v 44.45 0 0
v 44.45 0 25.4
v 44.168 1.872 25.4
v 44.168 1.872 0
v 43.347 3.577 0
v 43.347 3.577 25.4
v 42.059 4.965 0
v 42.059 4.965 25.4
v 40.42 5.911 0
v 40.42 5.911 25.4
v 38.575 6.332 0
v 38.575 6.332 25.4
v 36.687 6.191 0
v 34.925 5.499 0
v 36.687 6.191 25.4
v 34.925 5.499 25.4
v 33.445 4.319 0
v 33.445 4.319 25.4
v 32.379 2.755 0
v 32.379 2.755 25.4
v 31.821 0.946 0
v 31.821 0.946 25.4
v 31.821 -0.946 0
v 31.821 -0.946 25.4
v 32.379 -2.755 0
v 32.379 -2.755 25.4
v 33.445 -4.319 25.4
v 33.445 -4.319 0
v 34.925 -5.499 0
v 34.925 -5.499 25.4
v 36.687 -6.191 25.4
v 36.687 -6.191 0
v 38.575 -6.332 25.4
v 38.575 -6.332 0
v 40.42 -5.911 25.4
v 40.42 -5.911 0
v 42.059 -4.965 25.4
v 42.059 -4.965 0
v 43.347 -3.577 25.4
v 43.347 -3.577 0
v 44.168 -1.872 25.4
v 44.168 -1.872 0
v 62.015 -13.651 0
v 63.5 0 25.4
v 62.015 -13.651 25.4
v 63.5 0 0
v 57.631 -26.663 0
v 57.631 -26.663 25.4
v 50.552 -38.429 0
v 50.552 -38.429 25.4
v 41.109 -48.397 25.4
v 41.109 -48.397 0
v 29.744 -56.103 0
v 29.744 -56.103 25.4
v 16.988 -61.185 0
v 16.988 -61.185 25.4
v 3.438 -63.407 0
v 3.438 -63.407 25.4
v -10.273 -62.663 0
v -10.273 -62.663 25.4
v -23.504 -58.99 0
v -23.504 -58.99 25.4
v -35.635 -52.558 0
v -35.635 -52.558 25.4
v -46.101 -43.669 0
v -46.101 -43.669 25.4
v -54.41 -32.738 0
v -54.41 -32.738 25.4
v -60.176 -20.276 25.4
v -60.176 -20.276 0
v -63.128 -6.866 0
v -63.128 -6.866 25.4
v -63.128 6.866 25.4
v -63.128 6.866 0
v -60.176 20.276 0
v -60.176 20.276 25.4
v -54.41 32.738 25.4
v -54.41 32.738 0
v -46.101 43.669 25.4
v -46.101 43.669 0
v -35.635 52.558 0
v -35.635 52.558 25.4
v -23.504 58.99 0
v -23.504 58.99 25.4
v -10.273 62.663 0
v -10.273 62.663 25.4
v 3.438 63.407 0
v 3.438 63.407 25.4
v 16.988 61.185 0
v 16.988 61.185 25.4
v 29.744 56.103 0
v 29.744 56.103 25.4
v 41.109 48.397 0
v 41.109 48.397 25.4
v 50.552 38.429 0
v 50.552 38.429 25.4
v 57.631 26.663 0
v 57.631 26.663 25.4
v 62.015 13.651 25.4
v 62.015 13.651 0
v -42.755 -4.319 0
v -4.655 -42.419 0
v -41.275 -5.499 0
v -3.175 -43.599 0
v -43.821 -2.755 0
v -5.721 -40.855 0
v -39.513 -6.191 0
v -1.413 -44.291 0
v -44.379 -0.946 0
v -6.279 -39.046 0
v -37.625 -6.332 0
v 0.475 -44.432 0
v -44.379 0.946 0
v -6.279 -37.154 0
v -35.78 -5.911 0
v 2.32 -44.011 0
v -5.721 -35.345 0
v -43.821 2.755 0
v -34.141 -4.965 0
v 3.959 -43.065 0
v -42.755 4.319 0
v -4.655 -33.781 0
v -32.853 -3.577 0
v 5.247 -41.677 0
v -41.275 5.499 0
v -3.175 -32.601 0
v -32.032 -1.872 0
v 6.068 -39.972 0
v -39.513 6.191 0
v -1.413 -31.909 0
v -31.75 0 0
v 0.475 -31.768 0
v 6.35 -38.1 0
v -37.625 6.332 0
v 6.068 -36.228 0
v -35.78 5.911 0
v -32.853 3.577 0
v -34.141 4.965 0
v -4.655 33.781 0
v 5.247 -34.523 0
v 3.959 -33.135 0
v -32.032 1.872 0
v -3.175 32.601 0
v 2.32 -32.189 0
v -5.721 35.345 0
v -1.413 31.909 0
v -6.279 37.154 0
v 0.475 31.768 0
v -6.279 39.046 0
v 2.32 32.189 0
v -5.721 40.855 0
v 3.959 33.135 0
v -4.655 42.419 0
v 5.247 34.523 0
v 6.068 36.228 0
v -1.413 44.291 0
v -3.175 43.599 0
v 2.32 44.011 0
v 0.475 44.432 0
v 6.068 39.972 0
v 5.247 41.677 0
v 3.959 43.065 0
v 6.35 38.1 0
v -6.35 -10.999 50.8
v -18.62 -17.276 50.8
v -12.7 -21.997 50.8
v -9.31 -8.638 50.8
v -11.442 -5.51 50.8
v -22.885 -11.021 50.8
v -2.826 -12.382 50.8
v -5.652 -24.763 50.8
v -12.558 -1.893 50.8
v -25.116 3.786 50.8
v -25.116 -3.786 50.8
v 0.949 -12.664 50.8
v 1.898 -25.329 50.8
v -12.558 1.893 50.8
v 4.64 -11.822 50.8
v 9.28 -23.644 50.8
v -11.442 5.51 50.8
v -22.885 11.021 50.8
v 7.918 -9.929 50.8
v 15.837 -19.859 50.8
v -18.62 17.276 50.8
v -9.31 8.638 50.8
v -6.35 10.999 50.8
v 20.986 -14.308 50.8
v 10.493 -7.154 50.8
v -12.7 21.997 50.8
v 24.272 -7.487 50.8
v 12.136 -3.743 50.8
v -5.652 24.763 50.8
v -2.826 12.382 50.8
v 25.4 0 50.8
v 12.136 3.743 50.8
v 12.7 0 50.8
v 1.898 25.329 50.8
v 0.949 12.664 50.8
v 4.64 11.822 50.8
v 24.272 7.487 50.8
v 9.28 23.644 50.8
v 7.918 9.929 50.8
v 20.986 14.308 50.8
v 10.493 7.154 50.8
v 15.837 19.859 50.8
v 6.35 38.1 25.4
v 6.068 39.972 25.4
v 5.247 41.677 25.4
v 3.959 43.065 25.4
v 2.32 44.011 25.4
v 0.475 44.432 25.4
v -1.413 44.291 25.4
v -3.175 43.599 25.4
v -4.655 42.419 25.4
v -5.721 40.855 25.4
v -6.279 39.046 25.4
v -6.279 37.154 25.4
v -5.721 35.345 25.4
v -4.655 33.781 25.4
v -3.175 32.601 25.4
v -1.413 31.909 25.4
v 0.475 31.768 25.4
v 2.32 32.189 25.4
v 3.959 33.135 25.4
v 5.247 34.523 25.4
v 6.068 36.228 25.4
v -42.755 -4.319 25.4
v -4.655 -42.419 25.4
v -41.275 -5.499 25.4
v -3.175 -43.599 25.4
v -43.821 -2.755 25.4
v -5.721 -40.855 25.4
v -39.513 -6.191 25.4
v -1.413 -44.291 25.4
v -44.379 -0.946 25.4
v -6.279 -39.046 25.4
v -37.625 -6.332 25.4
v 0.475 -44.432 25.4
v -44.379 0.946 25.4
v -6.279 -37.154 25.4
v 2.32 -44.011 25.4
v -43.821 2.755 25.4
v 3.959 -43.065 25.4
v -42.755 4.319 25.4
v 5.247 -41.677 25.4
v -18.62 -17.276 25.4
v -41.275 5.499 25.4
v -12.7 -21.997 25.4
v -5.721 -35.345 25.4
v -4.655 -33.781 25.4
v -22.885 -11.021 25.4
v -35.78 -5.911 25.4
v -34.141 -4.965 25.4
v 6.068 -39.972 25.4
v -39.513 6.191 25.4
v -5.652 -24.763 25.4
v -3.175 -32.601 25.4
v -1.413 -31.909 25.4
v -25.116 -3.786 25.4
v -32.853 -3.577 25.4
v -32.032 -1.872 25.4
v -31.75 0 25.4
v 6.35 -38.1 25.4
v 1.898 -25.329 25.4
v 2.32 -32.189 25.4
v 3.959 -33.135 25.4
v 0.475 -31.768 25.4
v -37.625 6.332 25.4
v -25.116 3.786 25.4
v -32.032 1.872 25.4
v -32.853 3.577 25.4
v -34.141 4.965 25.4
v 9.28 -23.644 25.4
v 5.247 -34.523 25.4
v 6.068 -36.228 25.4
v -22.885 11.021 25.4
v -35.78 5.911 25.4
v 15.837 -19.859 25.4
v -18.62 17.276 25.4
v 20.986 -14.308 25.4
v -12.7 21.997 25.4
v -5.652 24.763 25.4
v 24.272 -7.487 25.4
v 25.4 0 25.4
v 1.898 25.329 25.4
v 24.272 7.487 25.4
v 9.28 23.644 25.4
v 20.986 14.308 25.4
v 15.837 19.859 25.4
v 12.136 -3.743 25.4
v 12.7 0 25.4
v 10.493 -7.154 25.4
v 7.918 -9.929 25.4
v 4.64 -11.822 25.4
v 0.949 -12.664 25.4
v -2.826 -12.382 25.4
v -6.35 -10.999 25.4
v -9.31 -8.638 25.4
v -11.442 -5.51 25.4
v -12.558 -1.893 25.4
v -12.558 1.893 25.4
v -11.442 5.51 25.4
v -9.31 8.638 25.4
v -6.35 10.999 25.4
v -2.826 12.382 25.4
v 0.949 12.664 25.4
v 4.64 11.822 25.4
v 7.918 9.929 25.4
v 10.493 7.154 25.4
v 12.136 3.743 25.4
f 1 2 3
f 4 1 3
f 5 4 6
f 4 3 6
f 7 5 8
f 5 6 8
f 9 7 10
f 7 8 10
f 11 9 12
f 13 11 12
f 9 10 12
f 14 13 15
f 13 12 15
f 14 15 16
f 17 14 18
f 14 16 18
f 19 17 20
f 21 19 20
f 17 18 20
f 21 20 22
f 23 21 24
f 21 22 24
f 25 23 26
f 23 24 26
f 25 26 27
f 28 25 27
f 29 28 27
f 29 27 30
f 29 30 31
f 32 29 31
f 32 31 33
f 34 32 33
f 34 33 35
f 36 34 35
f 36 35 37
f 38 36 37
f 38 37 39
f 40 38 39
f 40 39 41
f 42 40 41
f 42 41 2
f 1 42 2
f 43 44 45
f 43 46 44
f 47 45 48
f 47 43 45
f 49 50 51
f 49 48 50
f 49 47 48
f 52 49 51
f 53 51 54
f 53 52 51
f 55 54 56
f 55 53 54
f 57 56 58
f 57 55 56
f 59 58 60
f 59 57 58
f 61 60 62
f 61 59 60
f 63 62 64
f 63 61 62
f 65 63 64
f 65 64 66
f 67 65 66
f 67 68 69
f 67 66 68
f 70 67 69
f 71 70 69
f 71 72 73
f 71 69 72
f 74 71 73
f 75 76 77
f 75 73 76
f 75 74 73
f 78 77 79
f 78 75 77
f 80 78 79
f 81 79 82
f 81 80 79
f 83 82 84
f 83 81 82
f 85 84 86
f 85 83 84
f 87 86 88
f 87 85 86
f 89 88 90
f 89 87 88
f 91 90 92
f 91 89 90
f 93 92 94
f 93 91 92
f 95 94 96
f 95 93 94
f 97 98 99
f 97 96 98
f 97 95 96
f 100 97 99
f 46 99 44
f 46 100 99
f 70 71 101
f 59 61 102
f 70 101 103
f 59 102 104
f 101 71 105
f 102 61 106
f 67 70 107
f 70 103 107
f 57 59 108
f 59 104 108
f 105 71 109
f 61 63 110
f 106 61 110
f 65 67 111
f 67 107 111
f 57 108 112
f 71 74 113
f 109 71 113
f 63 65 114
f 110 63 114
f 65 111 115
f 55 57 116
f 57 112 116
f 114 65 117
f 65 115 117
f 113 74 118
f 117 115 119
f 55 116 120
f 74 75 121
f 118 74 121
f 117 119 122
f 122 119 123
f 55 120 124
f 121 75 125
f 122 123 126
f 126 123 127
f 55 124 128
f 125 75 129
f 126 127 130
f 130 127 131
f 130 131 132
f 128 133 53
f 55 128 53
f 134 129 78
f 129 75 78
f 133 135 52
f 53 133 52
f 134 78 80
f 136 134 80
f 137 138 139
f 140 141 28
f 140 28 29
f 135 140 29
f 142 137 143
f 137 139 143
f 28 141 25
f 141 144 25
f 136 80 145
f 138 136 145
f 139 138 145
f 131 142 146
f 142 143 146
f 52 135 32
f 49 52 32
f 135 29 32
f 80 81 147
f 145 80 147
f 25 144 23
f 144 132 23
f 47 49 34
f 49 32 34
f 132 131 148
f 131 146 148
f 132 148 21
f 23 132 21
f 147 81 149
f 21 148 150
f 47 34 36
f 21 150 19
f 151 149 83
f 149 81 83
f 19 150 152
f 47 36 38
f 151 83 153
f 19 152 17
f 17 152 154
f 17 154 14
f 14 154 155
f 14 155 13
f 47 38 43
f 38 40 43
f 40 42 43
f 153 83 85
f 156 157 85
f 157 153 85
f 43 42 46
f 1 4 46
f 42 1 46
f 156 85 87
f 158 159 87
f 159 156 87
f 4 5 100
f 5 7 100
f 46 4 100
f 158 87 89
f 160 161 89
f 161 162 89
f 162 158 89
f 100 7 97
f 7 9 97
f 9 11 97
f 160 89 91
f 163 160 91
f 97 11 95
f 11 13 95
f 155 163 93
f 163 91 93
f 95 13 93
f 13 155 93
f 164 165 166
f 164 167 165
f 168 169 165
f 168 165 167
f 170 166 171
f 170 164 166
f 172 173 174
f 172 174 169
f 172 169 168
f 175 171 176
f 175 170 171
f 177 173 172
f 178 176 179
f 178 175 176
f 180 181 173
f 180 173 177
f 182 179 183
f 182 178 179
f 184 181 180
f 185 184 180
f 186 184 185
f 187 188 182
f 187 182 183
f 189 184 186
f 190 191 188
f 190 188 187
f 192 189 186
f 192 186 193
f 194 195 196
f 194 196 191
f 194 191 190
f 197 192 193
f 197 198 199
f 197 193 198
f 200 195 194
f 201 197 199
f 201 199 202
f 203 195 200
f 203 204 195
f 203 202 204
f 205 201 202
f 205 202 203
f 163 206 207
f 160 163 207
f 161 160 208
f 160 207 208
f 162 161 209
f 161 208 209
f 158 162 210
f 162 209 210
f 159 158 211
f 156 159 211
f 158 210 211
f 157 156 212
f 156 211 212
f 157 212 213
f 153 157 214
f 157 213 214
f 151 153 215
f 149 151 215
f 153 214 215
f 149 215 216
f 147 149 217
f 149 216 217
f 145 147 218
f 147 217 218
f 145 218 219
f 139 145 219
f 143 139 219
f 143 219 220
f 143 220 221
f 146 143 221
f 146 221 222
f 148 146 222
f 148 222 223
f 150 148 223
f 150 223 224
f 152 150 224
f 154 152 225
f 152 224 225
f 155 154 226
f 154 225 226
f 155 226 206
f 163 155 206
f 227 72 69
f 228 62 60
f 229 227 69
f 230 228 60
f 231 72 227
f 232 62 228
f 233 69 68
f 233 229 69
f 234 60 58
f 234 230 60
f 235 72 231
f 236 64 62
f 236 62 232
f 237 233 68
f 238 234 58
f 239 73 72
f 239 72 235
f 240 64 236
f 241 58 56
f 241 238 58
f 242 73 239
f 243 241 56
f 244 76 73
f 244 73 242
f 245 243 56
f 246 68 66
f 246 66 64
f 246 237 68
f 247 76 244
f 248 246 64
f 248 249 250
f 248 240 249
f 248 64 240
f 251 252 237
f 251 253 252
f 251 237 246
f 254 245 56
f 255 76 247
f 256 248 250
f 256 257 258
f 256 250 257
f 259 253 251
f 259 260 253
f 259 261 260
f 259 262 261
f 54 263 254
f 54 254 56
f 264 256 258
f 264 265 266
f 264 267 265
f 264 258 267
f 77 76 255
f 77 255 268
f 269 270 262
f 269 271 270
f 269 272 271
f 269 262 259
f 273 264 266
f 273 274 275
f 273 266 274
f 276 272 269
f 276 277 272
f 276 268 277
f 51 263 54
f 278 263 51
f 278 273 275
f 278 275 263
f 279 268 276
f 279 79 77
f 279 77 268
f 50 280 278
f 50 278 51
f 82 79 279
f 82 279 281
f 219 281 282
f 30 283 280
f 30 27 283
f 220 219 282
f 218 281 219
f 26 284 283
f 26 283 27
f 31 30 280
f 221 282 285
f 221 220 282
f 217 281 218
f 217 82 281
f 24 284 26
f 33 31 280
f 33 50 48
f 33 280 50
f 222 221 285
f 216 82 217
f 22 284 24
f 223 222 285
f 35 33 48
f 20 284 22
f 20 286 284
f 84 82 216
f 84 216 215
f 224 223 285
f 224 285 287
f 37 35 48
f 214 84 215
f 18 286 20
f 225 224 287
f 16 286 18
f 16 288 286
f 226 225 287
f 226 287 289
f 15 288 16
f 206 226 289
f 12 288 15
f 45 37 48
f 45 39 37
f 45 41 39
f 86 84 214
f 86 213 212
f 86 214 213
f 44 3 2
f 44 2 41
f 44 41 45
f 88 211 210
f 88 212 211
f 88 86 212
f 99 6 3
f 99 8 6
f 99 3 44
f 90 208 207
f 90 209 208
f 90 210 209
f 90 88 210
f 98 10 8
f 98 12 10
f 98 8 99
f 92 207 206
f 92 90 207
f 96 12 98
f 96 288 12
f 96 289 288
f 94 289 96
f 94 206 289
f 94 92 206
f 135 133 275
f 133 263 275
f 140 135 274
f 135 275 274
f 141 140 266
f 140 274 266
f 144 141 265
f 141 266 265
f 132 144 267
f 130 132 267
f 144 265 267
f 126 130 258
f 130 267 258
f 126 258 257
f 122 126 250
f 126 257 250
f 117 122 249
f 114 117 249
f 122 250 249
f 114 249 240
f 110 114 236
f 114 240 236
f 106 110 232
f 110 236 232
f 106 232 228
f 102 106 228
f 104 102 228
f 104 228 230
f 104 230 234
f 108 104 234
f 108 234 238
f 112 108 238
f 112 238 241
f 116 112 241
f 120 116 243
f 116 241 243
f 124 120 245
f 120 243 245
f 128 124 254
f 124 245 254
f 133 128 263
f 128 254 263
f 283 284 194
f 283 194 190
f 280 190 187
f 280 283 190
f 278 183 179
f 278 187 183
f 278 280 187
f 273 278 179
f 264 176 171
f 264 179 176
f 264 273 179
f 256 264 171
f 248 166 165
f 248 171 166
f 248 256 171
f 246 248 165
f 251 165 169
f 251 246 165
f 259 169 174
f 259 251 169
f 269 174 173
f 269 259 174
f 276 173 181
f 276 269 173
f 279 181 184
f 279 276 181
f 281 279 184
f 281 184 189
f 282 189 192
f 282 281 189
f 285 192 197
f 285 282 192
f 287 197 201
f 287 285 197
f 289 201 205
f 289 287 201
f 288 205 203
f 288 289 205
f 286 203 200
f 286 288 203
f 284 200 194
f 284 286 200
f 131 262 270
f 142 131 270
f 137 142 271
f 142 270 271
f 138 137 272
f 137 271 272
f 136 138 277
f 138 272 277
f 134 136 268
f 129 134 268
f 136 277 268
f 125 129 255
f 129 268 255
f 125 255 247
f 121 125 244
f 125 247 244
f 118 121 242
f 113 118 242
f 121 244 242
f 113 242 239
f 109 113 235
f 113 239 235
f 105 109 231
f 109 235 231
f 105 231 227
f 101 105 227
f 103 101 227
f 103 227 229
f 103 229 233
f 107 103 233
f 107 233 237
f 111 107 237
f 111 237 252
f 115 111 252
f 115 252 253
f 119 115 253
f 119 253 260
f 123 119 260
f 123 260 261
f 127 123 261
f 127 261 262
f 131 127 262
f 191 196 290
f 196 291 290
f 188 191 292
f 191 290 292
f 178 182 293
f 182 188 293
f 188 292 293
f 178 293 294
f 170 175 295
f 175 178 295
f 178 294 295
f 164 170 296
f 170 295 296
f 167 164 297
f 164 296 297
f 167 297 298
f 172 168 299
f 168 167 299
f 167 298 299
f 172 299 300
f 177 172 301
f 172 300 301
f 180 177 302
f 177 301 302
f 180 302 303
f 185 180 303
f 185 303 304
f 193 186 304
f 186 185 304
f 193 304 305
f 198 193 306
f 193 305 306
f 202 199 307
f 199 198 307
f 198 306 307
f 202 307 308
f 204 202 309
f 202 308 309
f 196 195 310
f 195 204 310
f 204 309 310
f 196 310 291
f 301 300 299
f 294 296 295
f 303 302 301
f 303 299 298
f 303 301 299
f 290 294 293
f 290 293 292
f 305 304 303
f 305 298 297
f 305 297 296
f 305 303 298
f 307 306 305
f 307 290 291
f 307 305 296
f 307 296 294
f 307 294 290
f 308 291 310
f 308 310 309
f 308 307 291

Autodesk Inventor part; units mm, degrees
ref_plane "YZ Plane" through (0, 0, 0) normal (1, 0, 0) x (0, 1, 0)
ref_plane "XZ Plane" through (0, 0, 0) normal (0, 1, 0) x (-1, 0, 0)
ref_plane "XY Plane" through (0, 0, 0) normal (0, 0, 1) x (1, 0, 0)
sketch "Sketch1" plane through (0, 0, 0) normal (0, 0, 1) x (1, 0, 0)
  circle A0 centre (0, 0) radius 63.5
  dimension "d0" = 127
extrude "Extrusion1" add sketch "Sketch1" along normal blind 25.4
sketch "Sketch2" plane through (0, 0, 25.4) normal (0, 0, 1) x (1, 0, 0)
  circle A0 centre (0, 0) radius 25.4
  circle A1 centre (0, 0) radius 12.7
  circle A2 centre (0, -38.1) radius 6.35
  circle A3 centre (-38.1, 0) radius 6.35
  dimension "d3" = 50.8
  dimension "d4" = 25.4
  dimension "d5" = 12.7
  dimension "d6" = 38.1
  dimension "d7" = 12.7
  dimension "d8" = 38.1
sketch "Sketch3" plane through (0, 0, 25.4) normal (0, 0, 1) x (1, 0, 0)
  circle A0 centre (38.1, 0) radius 6.35
  circle A1 centre (0, 38.1) radius 6.35
  point P0 (0, 0)
  dimension "d9" = 12.7
  dimension "d10" = 38.1
  dimension "d11" = 12.7
  dimension "d12" = 38.1
extrude "Extrusion2" add sketch "Sketch2" along normal blind 25.4 contours A0
sketch "Sketch4" plane through (0, 0, 25.4) normal (0, 0, 1) x (1, 0, 0)
  circle A0 centre (-38.1, 0) radius 6.35
  circle A1 centre (0, -38.1) radius 6.35
  point P0 (0, 0)
  dimension "d15" = 12.7
  dimension "d16" = 38.1
  dimension "d17" = 12.7
  dimension "d18" = 38.1
extrude "Extrusion3" cut sketch "Sketch3" against normal blind 381 contours A1
extrude "Extrusion4" cut sketch "Sketch4" against normal blind 381
sketch "Sketch5" plane through (0, 0, 25.4) normal (0, 0, 1) x (1, 0, 0)
  circle A0 centre (38.1, 0) radius 6.35
  point P0 (0, 0)
  dimension "d23" = 12.7
  dimension "d24" = 38.1
extrude "Extrusion5" cut sketch "Sketch5" against normal blind 381
properties part number "test 2018 1"
